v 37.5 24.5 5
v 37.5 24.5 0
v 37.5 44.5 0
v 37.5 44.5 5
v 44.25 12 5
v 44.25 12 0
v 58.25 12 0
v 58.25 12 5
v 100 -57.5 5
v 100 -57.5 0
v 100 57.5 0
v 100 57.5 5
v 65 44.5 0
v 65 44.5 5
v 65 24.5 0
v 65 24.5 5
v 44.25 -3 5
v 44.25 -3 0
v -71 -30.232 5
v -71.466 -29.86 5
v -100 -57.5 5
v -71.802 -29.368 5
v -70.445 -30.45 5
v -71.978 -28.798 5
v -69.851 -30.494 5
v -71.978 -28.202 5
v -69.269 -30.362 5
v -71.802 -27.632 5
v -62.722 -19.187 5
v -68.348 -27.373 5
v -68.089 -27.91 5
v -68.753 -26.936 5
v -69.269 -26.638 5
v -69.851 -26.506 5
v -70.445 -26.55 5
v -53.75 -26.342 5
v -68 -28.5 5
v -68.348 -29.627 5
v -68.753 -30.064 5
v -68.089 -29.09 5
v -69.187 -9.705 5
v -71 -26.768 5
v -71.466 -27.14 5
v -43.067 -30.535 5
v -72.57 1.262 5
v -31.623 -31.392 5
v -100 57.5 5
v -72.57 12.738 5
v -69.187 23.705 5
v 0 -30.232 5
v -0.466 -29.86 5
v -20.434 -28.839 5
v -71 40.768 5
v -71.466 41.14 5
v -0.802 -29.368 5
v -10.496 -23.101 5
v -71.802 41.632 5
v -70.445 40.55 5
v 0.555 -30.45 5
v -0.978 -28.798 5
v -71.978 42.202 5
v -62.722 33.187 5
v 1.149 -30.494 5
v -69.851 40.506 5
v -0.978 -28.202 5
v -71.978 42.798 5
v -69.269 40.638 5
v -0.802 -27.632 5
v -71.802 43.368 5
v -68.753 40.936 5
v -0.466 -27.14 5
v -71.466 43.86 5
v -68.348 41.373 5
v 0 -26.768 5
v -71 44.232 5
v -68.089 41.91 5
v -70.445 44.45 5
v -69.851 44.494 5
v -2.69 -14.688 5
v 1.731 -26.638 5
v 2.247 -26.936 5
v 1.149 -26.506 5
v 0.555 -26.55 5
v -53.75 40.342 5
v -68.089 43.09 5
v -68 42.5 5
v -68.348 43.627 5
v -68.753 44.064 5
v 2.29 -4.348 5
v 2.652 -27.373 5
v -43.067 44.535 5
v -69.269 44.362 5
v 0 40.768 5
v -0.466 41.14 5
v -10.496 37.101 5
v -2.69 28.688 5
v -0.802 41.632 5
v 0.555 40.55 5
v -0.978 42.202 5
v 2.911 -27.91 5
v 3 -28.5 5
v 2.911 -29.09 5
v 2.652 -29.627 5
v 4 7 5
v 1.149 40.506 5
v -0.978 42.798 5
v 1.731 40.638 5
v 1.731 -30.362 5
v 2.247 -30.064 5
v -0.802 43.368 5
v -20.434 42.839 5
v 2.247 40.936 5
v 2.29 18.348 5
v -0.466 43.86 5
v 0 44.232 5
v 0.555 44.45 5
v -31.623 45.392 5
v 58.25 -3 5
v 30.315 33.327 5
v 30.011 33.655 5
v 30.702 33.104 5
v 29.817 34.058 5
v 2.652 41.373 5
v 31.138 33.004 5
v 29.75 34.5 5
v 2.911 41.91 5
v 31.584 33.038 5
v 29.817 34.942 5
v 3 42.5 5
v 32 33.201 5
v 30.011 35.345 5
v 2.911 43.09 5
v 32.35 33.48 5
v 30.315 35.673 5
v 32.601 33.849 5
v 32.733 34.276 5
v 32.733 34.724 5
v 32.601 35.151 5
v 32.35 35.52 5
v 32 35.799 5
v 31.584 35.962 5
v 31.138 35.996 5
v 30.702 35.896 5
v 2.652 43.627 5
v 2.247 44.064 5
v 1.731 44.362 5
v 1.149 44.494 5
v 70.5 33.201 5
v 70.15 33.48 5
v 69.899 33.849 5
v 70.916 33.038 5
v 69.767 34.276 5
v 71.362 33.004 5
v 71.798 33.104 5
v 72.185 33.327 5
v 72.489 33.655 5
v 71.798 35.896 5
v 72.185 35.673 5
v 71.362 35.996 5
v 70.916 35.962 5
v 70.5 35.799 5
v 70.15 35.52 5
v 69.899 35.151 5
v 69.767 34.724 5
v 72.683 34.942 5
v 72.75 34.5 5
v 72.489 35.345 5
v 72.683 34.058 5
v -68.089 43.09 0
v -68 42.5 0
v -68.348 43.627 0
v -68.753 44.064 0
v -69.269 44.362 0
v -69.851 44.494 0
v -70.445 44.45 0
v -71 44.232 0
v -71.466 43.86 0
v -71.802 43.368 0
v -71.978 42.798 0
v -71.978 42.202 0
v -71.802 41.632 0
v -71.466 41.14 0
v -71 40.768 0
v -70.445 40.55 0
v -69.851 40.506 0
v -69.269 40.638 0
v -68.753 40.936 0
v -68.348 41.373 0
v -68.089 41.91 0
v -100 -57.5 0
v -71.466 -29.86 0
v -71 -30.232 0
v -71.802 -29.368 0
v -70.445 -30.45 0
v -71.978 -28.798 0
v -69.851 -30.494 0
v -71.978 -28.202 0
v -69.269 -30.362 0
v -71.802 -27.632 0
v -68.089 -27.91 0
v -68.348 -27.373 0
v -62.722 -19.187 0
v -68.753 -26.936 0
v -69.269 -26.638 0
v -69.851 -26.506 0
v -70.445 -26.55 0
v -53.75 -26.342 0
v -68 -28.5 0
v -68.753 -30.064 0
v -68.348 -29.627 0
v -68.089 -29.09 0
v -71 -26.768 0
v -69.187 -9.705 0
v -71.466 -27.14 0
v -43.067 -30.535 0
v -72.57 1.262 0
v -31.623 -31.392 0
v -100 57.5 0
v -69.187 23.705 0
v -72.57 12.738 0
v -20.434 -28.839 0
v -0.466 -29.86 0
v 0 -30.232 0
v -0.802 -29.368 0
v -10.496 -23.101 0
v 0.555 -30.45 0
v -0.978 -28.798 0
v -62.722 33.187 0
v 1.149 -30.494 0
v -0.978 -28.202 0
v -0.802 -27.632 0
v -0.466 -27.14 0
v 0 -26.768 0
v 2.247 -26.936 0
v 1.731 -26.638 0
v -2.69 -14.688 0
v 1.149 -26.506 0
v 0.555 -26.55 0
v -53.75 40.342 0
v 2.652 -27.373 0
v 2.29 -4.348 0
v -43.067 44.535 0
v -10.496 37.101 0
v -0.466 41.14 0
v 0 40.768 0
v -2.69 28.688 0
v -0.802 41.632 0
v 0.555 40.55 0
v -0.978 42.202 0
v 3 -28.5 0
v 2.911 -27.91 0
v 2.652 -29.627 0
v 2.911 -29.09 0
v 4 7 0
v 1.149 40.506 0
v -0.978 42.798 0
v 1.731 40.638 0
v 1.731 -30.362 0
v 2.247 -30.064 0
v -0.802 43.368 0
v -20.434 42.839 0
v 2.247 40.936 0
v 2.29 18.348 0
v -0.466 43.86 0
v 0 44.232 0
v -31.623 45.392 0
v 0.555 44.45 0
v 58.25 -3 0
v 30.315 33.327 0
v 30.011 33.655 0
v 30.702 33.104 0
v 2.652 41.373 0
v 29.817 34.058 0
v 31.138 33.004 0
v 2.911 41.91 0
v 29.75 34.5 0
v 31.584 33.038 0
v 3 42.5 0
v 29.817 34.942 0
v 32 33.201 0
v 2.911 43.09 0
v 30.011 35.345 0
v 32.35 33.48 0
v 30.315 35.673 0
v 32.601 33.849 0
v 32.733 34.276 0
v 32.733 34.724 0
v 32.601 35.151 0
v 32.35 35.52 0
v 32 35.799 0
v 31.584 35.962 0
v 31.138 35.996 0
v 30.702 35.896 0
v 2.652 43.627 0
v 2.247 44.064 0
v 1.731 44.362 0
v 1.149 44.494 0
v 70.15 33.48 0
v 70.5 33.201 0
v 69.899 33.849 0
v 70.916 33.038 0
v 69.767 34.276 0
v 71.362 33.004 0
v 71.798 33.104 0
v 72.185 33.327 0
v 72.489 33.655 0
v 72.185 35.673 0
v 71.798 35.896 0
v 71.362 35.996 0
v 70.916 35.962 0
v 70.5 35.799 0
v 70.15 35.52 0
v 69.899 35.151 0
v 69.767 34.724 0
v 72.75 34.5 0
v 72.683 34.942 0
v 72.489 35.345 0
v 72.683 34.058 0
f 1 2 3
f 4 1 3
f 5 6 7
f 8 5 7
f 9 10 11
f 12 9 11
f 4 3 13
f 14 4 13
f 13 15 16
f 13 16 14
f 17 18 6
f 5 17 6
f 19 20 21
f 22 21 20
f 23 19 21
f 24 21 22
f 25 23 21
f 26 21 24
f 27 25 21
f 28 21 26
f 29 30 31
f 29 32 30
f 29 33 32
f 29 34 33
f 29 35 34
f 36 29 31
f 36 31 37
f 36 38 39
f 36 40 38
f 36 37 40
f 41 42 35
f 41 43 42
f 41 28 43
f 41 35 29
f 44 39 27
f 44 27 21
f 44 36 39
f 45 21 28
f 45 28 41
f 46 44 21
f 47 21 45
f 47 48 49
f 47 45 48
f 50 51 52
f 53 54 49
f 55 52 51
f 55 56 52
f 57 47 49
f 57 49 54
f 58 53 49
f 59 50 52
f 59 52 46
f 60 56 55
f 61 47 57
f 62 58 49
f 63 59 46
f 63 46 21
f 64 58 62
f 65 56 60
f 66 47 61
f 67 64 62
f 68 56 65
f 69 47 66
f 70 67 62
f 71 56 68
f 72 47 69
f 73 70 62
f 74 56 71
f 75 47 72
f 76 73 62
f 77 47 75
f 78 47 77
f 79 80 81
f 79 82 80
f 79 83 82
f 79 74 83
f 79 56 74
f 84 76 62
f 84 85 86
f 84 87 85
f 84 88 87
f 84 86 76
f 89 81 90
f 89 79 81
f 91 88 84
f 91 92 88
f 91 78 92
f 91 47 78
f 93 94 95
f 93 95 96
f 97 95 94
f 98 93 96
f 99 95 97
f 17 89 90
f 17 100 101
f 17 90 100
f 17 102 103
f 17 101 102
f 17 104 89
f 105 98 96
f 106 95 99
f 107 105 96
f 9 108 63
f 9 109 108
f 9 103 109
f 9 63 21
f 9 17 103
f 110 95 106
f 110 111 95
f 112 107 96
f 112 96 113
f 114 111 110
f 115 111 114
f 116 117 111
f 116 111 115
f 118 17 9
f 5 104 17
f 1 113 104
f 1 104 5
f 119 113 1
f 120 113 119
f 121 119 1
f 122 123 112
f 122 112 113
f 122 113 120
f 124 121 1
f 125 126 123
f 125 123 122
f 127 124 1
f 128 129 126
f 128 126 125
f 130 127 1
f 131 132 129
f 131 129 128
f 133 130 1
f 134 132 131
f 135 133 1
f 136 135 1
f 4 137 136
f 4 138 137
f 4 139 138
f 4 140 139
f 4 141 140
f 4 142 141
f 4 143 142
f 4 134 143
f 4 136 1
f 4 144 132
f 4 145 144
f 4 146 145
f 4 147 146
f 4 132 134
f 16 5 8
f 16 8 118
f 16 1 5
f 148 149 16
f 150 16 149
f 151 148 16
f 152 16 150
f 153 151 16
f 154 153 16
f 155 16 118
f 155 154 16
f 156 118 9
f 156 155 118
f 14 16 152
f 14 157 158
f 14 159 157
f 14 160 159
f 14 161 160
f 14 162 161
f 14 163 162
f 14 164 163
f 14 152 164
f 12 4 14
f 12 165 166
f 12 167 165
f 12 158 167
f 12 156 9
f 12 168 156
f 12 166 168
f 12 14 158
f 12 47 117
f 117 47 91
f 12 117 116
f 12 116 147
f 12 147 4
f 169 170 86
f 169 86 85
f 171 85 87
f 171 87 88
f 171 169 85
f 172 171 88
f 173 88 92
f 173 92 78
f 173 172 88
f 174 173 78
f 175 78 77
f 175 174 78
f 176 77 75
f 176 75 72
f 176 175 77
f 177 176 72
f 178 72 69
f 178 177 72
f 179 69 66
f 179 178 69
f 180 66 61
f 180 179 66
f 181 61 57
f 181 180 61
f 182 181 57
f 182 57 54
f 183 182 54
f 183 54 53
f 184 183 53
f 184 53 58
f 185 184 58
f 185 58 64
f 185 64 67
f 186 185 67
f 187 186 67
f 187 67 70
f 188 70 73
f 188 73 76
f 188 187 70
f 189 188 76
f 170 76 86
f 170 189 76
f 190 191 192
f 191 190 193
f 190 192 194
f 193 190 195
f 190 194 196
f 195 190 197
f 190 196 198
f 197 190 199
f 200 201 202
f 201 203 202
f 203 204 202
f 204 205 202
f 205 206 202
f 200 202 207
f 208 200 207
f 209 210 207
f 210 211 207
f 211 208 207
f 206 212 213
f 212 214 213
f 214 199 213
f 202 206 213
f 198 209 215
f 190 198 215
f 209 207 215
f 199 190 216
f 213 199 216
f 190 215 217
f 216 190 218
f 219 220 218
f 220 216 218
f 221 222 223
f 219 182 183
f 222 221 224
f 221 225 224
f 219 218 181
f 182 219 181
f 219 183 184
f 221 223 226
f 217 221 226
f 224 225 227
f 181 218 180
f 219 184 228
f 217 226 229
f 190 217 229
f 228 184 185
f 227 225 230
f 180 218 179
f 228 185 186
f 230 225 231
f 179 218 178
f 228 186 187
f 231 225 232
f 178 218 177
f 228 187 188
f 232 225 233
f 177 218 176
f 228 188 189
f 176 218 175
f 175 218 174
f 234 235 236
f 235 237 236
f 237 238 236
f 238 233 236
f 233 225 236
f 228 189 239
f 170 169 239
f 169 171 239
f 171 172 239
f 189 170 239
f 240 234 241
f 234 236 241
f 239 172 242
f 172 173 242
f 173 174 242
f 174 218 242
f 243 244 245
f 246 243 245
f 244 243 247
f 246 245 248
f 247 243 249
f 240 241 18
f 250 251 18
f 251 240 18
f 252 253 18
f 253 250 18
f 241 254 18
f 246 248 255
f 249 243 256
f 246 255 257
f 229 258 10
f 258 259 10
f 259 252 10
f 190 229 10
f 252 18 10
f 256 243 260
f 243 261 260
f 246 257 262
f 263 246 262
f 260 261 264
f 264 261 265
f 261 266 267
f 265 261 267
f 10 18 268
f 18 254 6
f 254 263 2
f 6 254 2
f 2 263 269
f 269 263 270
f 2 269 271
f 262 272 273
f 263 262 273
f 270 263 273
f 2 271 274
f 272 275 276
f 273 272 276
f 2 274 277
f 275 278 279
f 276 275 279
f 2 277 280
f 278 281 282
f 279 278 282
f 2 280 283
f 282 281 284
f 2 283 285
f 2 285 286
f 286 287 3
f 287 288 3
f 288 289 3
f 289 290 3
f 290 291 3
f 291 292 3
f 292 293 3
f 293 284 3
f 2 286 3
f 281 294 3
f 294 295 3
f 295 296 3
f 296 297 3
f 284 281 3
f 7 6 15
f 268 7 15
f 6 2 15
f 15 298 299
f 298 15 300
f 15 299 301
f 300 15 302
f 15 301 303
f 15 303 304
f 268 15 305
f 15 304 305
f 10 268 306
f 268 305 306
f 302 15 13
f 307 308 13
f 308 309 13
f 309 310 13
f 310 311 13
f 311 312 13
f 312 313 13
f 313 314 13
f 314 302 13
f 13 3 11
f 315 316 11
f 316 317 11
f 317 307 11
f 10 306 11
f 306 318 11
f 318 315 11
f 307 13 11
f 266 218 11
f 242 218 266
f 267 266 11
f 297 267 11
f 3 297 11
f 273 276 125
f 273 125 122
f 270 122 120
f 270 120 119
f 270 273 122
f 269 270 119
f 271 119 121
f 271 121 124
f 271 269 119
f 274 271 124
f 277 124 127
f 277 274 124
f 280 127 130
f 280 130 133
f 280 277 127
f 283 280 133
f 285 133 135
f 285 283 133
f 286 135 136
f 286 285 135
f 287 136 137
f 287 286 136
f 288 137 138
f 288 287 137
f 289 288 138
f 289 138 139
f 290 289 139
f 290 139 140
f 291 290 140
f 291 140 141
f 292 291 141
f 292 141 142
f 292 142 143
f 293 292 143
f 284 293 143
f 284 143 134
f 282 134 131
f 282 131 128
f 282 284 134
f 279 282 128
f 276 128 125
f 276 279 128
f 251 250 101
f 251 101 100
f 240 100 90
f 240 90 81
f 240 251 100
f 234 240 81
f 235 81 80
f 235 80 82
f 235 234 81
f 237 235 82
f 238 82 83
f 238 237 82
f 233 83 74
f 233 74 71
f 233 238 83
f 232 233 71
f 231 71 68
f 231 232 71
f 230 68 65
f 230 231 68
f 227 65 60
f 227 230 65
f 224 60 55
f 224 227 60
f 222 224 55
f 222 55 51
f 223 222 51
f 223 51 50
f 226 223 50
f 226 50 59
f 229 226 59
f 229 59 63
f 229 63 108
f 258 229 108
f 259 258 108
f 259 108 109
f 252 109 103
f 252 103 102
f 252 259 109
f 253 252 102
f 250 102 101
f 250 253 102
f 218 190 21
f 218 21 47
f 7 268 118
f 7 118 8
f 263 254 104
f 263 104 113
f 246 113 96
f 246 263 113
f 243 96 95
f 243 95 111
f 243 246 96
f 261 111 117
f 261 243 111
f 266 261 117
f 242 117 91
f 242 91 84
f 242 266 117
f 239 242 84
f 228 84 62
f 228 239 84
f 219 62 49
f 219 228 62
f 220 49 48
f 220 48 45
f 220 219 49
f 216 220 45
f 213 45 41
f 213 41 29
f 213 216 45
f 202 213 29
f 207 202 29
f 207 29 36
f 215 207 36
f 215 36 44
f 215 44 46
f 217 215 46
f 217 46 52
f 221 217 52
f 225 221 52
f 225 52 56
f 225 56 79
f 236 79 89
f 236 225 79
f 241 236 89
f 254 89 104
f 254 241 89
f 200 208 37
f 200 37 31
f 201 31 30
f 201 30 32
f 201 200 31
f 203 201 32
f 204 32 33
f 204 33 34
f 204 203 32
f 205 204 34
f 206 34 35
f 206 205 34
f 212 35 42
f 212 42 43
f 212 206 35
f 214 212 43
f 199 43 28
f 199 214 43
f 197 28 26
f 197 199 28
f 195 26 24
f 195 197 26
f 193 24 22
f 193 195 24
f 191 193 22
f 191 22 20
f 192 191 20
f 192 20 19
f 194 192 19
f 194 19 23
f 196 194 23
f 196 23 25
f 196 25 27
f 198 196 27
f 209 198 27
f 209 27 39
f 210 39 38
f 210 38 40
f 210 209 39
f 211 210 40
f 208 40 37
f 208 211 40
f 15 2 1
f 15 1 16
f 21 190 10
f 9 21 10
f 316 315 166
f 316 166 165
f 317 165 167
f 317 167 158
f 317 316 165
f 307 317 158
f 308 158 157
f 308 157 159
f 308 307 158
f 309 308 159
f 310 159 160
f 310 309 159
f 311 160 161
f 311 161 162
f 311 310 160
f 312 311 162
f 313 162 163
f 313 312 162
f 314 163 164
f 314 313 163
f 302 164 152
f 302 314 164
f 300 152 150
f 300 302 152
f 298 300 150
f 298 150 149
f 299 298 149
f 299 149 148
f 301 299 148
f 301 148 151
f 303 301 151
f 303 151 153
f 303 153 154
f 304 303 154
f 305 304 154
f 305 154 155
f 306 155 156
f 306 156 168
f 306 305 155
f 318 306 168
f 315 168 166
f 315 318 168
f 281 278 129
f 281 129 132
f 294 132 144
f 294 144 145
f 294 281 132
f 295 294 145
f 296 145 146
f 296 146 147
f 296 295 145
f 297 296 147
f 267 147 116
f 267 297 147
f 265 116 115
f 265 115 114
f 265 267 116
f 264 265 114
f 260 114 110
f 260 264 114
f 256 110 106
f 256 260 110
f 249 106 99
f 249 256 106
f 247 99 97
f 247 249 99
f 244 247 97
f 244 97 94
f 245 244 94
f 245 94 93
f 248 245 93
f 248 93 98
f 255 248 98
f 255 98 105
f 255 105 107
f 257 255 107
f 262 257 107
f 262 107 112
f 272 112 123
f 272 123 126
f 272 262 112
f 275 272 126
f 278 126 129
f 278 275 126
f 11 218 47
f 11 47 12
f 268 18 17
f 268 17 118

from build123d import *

# Parameters (mm, degrees)
SKETCH1_W           = 200
SKETCH1_H           = 115
SKETCH1_R           = 38.5
SKETCH1_R_2         = 2
SKETCH1_R_3         = 1.5
SKETCH1_W_2         = 27.5
SKETCH1_H_2         = 20
SKETCH1_W_3         = 14
SKETCH1_H_3         = 15
BOSS_EXTRUDE1_DEPTH = 5


with BuildPart() as part:
    # Sketch1 → Boss-Extrude1 (new body)
    with BuildSketch(Plane.XY):
        Rectangle(SKETCH1_W, SKETCH1_H)
        with Locations((-34.5, 7)):
            Circle(SKETCH1_R, mode=Mode.SUBTRACT)
        with Locations((-70, 42.5)):
            Circle(SKETCH1_R_2, mode=Mode.SUBTRACT)
        with Locations((1, 42.5)):
            Circle(SKETCH1_R_2, mode=Mode.SUBTRACT)
        with Locations((1, -28.5)):
            Circle(SKETCH1_R_2, mode=Mode.SUBTRACT)
        with Locations((-70, -28.5)):
            Circle(SKETCH1_R_2, mode=Mode.SUBTRACT)
        with Locations((71.25, 34.5)):
            Circle(SKETCH1_R_3, mode=Mode.SUBTRACT)
        with Locations(Location((31.25, 34.5, 0), (0, 0, 180))):
            Circle(SKETCH1_R_3, mode=Mode.SUBTRACT)
        with Locations((51.25, 34.5)):
            Rectangle(SKETCH1_W_2, SKETCH1_H_2, mode=Mode.SUBTRACT)
        with Locations((51.25, 4.5)):
            Rectangle(SKETCH1_W_3, SKETCH1_H_3, mode=Mode.SUBTRACT)
    extrude(amount=BOSS_EXTRUDE1_DEPTH)


solid = part.part
